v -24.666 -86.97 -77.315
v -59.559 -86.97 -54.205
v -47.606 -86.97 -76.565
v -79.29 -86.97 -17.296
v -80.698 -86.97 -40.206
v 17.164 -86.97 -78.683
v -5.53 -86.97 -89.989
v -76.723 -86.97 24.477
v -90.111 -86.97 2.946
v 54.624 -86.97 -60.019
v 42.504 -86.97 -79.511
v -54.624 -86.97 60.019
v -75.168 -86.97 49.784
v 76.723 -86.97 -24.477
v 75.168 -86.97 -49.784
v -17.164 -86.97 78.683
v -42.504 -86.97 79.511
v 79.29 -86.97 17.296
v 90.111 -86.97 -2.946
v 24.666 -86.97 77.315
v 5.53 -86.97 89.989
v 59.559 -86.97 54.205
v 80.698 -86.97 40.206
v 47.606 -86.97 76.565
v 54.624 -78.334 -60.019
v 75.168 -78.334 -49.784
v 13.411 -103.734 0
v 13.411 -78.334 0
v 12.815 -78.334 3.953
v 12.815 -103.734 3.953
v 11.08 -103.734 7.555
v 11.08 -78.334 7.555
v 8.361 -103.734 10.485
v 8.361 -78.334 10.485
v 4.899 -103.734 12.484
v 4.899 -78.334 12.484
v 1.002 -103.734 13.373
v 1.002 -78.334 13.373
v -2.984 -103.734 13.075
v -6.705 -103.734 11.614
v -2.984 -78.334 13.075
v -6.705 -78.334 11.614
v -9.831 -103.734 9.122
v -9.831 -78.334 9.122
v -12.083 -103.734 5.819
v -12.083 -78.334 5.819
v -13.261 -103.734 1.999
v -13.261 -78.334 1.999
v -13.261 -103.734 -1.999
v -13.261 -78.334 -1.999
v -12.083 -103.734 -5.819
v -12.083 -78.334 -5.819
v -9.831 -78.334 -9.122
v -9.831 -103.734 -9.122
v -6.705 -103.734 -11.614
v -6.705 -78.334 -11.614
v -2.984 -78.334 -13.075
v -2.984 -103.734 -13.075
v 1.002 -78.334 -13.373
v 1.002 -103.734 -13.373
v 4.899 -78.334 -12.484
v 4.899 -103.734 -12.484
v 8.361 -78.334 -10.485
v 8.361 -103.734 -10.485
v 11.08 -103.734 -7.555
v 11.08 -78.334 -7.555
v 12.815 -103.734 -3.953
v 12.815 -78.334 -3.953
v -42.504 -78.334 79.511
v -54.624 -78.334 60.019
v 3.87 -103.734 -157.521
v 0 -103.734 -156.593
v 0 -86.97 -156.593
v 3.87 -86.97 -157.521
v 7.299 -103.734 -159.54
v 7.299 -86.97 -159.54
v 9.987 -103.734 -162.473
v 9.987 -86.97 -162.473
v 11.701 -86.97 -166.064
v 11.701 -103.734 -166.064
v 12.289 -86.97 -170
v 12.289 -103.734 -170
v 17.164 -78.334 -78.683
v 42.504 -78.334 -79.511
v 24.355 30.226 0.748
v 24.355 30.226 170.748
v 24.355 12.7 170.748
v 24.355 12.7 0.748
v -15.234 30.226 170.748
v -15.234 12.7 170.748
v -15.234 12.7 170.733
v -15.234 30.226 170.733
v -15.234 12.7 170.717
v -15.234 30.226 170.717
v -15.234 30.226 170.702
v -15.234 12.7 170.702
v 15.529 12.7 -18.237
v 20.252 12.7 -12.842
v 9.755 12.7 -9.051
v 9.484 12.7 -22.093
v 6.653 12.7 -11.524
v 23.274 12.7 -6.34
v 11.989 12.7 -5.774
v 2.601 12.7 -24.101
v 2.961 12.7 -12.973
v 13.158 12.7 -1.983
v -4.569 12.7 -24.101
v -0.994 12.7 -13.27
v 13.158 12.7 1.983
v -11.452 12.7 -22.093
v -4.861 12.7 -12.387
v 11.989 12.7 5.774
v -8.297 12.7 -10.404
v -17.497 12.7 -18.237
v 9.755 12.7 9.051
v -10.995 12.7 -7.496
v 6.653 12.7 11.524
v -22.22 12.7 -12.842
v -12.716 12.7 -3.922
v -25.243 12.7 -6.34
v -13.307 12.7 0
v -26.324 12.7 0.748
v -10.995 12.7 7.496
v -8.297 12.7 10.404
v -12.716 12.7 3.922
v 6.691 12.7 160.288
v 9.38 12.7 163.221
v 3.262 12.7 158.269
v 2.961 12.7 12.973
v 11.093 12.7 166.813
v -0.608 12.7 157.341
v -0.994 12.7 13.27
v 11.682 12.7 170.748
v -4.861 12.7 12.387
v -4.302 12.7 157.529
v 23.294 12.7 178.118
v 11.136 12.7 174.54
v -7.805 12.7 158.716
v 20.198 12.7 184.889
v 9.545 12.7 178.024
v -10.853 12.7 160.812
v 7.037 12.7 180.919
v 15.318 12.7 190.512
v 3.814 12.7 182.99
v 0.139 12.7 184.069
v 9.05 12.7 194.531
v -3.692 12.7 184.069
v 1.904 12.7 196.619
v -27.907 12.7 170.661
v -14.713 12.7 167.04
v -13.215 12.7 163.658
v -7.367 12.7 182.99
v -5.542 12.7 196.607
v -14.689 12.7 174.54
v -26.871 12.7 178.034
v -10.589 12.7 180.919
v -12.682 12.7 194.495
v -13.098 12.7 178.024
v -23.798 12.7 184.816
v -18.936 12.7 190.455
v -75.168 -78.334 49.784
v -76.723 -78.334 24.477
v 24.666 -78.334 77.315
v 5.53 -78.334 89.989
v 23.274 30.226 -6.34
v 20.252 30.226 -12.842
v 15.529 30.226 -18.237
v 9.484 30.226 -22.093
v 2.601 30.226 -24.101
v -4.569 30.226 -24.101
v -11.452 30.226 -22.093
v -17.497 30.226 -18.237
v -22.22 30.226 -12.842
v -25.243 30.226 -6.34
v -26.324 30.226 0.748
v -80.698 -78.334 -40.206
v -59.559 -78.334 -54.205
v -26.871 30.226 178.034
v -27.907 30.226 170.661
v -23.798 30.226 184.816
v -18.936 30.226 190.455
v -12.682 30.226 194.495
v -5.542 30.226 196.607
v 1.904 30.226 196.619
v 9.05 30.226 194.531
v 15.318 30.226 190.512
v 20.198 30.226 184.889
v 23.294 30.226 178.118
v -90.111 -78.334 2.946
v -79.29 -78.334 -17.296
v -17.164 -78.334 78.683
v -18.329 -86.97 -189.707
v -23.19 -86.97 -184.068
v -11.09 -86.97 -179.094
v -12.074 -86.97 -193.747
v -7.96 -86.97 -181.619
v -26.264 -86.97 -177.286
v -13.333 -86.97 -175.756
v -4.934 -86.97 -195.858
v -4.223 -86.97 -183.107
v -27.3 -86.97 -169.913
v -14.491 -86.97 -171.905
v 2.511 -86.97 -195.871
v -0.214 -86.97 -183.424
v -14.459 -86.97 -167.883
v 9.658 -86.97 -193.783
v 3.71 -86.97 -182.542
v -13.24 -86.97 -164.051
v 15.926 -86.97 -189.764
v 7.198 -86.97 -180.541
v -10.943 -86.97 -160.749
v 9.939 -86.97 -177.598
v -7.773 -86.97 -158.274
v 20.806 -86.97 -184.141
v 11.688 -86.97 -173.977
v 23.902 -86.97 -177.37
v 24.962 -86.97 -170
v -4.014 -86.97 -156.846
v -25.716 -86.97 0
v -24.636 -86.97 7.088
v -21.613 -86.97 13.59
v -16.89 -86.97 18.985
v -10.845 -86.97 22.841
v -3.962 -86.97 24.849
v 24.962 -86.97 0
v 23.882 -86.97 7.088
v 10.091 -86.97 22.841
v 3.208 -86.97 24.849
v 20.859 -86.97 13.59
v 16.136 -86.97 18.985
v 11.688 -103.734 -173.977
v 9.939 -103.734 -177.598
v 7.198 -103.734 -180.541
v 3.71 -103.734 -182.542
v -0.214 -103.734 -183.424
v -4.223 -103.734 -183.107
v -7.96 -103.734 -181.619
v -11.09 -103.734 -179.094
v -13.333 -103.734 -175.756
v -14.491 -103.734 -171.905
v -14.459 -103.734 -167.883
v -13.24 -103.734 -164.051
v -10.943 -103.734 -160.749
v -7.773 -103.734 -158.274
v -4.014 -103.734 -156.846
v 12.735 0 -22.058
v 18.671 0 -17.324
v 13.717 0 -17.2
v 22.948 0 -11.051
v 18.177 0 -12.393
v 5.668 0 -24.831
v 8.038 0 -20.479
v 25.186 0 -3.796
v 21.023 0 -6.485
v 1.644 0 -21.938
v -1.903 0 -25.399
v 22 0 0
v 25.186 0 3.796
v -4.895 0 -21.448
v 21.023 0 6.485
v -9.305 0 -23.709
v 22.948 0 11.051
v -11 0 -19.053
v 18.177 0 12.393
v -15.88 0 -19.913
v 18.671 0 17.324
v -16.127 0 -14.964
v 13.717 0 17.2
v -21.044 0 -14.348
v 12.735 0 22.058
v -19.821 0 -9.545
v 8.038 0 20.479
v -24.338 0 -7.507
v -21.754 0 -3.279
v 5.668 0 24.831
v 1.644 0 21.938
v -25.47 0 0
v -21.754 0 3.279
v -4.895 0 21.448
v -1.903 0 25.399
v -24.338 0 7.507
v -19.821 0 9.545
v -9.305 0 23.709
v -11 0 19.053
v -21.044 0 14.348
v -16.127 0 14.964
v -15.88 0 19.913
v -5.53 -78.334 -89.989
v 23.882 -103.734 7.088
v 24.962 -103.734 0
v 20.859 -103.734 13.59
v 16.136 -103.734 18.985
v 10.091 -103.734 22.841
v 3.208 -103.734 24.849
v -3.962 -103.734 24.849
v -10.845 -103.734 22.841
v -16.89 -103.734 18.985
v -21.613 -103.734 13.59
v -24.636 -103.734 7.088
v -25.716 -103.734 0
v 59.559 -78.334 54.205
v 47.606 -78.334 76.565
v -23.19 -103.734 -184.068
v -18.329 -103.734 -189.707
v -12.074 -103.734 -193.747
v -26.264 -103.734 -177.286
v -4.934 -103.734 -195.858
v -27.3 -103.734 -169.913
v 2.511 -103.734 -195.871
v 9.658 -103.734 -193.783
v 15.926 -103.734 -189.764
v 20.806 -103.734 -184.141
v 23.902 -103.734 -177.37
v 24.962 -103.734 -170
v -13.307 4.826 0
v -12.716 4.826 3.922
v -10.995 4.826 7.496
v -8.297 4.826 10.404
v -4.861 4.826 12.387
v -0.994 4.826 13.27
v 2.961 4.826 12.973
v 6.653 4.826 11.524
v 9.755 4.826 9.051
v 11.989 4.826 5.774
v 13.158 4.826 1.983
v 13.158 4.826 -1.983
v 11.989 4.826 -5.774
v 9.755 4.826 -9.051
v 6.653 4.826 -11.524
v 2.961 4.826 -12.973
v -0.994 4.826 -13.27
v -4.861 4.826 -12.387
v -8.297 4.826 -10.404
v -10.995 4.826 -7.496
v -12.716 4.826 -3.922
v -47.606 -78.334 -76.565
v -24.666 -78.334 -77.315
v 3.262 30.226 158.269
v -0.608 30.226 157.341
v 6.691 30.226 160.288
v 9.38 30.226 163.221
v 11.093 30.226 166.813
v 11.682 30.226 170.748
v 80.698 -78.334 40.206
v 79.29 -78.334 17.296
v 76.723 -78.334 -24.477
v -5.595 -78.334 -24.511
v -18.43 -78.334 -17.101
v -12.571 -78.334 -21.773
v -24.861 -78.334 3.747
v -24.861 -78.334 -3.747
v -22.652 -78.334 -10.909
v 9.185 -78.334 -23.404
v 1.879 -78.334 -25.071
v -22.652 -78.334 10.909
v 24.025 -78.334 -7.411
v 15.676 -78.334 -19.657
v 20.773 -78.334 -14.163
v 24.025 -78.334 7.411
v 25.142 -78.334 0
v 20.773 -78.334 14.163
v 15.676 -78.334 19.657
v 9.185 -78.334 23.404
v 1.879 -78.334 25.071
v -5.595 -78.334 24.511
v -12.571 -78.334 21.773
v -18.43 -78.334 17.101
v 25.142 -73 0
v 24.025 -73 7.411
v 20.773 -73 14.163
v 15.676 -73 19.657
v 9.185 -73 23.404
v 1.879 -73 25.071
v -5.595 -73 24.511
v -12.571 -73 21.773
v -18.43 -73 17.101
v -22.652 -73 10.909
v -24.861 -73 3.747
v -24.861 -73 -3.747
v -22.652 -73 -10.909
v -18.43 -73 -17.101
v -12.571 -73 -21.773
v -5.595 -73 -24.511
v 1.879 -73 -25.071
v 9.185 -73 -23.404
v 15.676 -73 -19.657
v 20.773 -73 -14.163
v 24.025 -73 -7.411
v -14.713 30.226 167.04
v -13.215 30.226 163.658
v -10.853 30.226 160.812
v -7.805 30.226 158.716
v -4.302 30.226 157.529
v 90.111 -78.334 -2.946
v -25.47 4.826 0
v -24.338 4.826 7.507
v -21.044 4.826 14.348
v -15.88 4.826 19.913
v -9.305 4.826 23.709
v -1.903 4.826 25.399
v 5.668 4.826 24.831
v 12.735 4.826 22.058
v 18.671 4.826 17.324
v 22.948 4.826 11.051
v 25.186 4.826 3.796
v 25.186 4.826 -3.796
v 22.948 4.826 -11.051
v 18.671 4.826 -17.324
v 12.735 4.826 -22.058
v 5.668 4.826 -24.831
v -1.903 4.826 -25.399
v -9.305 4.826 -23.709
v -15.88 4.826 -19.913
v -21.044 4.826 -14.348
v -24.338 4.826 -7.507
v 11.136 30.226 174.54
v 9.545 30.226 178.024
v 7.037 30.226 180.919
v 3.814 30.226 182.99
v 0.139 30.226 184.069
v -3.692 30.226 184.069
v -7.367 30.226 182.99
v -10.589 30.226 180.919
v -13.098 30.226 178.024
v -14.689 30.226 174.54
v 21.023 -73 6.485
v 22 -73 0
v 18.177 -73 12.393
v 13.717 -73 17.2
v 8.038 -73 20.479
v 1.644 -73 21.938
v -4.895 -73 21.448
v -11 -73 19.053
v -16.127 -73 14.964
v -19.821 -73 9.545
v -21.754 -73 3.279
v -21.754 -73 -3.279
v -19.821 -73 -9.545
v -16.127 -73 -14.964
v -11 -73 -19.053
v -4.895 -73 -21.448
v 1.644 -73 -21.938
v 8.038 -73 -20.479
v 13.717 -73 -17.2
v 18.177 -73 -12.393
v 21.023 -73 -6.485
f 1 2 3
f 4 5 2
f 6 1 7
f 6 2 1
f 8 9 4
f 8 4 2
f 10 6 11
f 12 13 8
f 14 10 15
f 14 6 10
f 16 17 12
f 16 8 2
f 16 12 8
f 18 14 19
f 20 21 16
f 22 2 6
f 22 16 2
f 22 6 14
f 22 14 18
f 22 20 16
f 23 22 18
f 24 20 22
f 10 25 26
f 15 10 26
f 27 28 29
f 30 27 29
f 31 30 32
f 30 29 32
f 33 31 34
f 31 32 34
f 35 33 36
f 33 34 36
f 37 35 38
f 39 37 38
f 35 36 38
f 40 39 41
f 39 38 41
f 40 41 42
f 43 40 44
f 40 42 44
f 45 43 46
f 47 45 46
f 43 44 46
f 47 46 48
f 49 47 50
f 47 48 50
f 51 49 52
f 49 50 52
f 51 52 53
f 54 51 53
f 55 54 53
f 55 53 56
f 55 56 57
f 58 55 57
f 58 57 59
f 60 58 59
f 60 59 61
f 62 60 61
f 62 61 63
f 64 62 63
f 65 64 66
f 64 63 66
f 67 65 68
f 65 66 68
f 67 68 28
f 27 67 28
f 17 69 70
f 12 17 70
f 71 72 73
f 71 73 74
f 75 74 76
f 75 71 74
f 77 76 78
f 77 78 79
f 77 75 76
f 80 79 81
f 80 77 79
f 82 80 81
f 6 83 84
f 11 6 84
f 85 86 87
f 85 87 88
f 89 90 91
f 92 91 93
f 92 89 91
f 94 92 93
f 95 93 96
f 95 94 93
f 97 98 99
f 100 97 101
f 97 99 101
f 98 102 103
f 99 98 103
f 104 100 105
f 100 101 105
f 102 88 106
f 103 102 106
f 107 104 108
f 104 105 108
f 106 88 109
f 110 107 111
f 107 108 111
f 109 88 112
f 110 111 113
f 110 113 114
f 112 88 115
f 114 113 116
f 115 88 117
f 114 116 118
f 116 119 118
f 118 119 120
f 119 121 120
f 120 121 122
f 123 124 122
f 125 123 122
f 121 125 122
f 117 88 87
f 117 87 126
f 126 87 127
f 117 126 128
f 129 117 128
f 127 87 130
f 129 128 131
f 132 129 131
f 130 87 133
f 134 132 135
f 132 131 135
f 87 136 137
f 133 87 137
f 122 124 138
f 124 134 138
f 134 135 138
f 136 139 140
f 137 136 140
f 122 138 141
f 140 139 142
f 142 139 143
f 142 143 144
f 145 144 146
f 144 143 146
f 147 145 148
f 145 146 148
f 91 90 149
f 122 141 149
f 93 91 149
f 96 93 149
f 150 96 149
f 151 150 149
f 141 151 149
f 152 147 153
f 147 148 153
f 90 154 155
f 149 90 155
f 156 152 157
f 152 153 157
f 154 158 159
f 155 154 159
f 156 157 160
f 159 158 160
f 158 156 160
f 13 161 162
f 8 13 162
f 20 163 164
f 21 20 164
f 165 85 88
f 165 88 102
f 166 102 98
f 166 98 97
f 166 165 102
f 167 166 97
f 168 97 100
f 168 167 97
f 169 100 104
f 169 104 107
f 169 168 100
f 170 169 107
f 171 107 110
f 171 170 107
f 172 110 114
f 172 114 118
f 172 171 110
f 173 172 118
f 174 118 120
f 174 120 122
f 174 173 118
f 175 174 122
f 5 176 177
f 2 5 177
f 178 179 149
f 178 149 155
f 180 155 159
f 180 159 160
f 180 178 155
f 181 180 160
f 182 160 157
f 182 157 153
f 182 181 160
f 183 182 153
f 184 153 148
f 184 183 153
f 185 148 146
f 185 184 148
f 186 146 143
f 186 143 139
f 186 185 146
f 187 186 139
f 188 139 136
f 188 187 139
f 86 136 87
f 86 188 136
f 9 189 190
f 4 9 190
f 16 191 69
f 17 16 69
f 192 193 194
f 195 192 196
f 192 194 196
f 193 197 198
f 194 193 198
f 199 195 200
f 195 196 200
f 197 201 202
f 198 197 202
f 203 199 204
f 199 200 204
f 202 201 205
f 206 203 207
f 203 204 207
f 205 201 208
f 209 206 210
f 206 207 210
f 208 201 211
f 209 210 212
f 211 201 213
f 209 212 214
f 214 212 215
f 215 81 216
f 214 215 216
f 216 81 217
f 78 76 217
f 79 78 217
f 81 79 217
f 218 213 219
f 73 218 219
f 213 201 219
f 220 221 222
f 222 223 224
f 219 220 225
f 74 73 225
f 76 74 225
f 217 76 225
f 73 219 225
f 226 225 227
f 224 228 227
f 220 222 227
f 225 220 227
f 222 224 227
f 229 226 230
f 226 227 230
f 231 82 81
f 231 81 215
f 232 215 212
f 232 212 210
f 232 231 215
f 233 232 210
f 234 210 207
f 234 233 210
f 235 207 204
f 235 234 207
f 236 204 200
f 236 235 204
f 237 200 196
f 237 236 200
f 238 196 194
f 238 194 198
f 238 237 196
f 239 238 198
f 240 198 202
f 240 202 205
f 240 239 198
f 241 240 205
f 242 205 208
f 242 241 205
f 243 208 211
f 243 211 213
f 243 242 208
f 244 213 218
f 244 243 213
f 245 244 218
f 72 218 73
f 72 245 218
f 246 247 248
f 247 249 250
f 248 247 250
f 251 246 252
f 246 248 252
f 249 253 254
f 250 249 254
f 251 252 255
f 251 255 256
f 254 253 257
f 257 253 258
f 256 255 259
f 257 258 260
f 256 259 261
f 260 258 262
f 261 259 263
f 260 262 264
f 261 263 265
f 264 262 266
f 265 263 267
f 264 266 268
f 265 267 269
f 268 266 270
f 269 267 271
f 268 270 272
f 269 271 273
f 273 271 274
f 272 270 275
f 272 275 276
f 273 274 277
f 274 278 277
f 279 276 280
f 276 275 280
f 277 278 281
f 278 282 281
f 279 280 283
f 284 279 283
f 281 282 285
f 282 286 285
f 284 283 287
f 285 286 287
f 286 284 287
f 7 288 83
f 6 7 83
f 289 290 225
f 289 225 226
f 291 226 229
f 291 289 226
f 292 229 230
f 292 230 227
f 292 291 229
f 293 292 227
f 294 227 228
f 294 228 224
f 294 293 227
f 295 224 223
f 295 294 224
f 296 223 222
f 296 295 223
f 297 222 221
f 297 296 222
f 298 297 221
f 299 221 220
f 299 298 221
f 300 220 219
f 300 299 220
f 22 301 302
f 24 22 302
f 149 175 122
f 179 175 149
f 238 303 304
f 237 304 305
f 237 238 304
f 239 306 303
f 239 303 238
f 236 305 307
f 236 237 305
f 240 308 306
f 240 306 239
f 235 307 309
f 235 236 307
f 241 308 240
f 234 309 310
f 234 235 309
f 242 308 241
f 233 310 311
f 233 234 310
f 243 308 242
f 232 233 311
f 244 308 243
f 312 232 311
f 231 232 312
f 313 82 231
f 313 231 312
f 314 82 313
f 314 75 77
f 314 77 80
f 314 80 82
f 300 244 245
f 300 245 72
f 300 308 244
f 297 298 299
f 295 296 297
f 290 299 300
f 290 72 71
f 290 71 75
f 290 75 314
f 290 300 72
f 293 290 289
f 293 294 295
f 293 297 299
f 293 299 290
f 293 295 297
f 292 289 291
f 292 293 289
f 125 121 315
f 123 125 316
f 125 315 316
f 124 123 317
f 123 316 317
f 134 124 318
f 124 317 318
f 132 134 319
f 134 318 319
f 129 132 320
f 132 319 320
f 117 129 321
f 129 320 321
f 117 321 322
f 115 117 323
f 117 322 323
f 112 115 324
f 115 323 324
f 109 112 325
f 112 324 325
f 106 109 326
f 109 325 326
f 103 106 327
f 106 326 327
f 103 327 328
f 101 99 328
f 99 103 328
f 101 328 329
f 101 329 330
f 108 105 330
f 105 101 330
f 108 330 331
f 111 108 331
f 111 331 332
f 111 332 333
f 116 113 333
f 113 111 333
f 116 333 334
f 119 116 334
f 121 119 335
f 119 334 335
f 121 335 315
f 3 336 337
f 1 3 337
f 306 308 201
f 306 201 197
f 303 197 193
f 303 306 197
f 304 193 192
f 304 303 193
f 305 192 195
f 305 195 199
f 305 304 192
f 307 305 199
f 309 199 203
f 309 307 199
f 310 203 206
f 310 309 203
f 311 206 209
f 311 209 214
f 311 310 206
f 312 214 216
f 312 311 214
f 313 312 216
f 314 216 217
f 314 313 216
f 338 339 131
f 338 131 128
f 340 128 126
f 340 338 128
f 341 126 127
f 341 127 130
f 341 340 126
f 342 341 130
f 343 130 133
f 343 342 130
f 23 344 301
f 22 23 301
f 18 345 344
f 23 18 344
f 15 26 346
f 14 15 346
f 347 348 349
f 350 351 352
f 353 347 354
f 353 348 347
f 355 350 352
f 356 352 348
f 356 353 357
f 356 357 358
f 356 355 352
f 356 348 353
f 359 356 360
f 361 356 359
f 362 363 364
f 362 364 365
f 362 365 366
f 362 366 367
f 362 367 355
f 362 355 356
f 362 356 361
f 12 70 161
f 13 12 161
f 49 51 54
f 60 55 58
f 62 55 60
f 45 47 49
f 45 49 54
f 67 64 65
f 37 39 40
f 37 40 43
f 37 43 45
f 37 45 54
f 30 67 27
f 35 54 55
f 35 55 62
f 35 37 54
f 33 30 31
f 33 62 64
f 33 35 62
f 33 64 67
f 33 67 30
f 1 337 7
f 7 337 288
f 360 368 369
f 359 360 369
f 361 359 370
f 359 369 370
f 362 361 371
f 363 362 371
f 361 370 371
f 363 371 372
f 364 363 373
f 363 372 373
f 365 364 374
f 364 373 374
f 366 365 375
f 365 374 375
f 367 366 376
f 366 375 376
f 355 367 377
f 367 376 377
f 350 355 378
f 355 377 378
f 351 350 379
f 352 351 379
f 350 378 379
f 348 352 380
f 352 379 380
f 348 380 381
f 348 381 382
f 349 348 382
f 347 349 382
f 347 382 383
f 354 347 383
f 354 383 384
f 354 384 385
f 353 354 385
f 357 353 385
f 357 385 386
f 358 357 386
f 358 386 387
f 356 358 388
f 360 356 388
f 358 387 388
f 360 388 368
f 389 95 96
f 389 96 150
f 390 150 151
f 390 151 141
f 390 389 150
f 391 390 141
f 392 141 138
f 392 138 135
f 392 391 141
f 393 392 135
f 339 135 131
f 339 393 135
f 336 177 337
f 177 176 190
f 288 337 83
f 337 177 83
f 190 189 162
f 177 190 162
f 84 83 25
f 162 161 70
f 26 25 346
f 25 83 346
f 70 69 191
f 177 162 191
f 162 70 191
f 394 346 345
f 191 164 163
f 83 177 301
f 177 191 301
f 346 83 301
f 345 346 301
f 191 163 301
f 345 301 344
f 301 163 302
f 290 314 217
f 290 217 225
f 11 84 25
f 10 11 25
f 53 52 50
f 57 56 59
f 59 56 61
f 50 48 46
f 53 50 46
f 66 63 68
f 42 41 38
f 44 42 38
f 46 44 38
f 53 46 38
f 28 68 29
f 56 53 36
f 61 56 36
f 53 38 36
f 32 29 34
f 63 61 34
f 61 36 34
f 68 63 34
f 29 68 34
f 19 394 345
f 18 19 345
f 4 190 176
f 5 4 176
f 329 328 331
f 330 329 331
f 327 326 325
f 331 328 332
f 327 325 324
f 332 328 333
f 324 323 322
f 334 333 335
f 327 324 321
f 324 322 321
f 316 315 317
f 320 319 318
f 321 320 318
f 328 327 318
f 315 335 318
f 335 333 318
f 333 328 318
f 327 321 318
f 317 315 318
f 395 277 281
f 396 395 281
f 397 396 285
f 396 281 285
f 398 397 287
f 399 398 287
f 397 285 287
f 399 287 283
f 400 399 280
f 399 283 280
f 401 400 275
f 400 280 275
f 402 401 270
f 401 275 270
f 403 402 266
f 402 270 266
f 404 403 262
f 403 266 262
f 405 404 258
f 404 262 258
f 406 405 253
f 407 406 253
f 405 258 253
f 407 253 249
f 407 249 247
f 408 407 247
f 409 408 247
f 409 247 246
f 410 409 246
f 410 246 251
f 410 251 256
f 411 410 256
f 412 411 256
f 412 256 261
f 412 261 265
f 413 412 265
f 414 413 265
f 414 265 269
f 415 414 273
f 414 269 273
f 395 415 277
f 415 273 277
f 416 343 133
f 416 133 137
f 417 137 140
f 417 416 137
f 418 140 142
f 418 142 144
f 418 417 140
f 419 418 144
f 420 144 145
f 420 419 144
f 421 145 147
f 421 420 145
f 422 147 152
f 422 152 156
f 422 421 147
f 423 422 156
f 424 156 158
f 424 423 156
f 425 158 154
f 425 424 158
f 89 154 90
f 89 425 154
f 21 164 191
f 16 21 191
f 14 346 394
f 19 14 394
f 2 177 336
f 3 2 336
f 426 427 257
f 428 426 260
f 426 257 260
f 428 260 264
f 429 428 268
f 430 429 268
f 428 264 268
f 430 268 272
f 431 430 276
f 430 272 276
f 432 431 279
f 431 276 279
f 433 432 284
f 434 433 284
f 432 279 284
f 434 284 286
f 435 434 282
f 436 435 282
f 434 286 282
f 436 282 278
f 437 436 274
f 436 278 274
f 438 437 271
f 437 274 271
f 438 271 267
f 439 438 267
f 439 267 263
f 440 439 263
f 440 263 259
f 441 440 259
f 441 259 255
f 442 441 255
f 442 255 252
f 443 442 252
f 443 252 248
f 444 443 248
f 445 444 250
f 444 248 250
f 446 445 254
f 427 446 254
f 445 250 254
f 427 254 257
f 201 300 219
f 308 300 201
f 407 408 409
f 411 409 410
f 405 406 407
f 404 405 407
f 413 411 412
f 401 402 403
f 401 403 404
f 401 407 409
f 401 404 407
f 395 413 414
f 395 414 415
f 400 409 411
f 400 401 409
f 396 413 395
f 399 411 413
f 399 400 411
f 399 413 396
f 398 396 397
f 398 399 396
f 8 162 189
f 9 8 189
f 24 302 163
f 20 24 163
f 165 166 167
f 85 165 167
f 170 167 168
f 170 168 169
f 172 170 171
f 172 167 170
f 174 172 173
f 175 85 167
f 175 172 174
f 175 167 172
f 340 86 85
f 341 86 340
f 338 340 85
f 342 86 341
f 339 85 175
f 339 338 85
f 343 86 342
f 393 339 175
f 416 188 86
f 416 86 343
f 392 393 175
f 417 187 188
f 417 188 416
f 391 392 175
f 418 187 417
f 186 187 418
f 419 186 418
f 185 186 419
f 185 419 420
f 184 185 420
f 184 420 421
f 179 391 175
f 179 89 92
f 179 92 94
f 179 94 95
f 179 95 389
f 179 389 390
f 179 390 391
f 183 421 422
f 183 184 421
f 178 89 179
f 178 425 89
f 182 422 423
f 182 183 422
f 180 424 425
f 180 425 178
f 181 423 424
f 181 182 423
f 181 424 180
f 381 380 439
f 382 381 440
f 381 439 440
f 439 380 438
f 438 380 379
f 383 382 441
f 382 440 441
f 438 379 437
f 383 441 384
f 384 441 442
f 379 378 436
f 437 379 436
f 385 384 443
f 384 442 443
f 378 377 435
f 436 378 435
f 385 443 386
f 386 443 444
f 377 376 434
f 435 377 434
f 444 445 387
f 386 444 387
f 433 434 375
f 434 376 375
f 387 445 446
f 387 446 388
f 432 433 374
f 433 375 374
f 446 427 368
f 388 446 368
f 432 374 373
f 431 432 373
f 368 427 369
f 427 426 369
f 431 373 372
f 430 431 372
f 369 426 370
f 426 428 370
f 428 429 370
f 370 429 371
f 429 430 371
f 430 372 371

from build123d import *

# Parameters (mm, degrees)
F0_R      = 22
F1_DEPTH  = 73
F2_R      = 25.141688448
F3_DEPTH  = 5.334
F4_R      = 25.4700535037
F5_DEPTH  = 4.826
F6_R      = 13.3067091681
F7_DEPTH  = 25.4
F8_R      = 13.4107525154
F9_DEPTH  = 25.4
F11_DEPTH = 16.764
F13_DEPTH = 17.526
F15_DEPTH = 8.636


with BuildPart() as f1:
    # F0 (on Front) → F1 (new body)
    with BuildSketch(Plane.XZ):
        Circle(F0_R)
    extrude(amount=F1_DEPTH)

    # F2 (on face) → F3 (join)
    with BuildSketch(Plane.XZ.offset(73)):
        Circle(F2_R)
    extrude(amount=F3_DEPTH)

    # F4 (on face) → F5 (join)
    with BuildSketch(Plane(origin=(0, 0, 0), x_dir=(-1, 0, 0), z_dir=(0, 1, 0))):
        Circle(F4_R)
    extrude(amount=F5_DEPTH)


with BuildPart() as f7:
    # F6 (on face) → F7 (new body)
    with BuildSketch(Plane(origin=(0, 4.826, 0), x_dir=(-1, 0, 0), z_dir=(0, 1, 0))):
        Circle(F6_R)
    extrude(amount=F7_DEPTH)

    # F12 (on face) → F13 (join)
    with BuildSketch(Plane(origin=(0, 30.226, 0), x_dir=(-1, 0, 0), z_dir=(0, 1, 0))):
        with BuildLine():
            Line((-24.354988928, 0.7480883902), (0.6075108098, 0.7480883902))
            Line((0.6075108098, 0.7480883902), (0.6075108098, 157.3410739564))
            ThreePointArc((0.6075108098, 157.3410739564), (-8.1445009129, 161.654541128), (-11.6816051556, 170.7480883902))
            Line((-11.6816051556, 170.7480883902), (-24.354988928, 170.7480883902))
            Line((-24.354988928, 170.7480883902), (-24.354988928, 0.7480883902))
        make_face()
        with BuildLine():
            Line((26.3235455053, 0.7480883902), (0.6075108098, 0.7480883902))
            Line((0.6075108098, 0.7480883902), (-24.354988928, 0.7480883902))
            ThreePointArc((-24.354988928, 0.7480883902), (0.9842782886, -24.3560850854), (26.3235455053, 0.7480883902))
        make_face()
        with BuildLine():
            Line((0.6075108098, 157.3410739564), (0.6075108098, 0.7480883902))
            Line((0.6075108098, 0.7480883902), (26.3235455053, 0.7480883902))
            Line((26.3235455053, 0.7480883902), (27.9073545741, 170.6612540395))
            Line((27.9073545741, 170.6612540395), (15.2340346622, 170.7015648748))
            ThreePointArc((15.2340346622, 170.7015648748), (10.8526407, 160.8116292201), (0.6075108098, 157.3410739564))
        make_face()
        with BuildLine():
            Line((-24.354988928, 170.7480883902), (-11.6816051556, 170.7480883902))
            ThreePointArc((-11.6816051556, 170.7480883902), (1.7762549611, 184.2059485069), (15.2341150778, 170.7480883902))
            ThreePointArc((15.2341150778, 170.7480883902), (15.2340949738, 170.7248265978), (15.2340346622, 170.7015648748))
            Line((15.2340346622, 170.7015648748), (27.9073545741, 170.6612540395))
            ThreePointArc((27.9073545741, 170.6612540395), (1.8196721964, 196.8792962103), (-24.354988928, 170.7480883902))
        make_face()
    extrude(amount=-F13_DEPTH)


with BuildPart() as f9:
    # F8 (on face) → F9 (new body)
    with BuildSketch(Plane.XZ.offset(78.334)):
        Circle(F8_R)
    extrude(amount=F9_DEPTH)


with BuildPart() as f11:
    # F10 (on face) → F11 (new body)
    with BuildSketch(Plane.XZ.offset(103.734)):
        with BuildLine():
            Line((24.9624997377, 0), (0, 0))
            Line((0, 0), (0, -156.5929855662))
            ThreePointArc((0, -156.5929855662), (8.7520117226, -160.9064527378), (12.2891159654, -170))
            Line((12.2891159654, -170), (24.9624997377, -170))
            Line((24.9624997377, -170), (24.9624997377, 0))
        make_face()
        with BuildLine():
            Line((-25.7160346955, 0), (0, 0))
            Line((0, 0), (24.9624997377, 0))
            ThreePointArc((24.9624997377, 0), (-0.3767674789, 25.1041734756), (-25.7160346955, 0))
        make_face()
        with BuildLine():
            Line((0, -156.5929855662), (0, 0))
            Line((0, 0), (-25.7160346955, 0))
            Line((-25.7160346955, 0), (-27.2998437643, -169.9131656493))
            Line((-27.2998437643, -169.9131656493), (-14.6265238524, -169.9534764846))
            ThreePointArc((-14.6265238524, -169.9534764846), (-10.2451298902, -160.0635408299), (0, -156.5929855662))
        make_face()
        with BuildLine():
            Line((24.9624997377, -170), (12.2891159654, -170))
            ThreePointArc((12.2891159654, -170), (-1.1920059438, -183.4578400128), (-14.6265238524, -169.9534764846))
            Line((-14.6265238524, -169.9534764846), (-27.2998437643, -169.9131656493))
            ThreePointArc((-27.2998437643, -169.9131656493), (-1.2121613866, -196.13120782), (24.9624997377, -170))
        make_face()
    extrude(amount=-F11_DEPTH)


with BuildPart() as f15:
    # F14 (on face) → F15 (new body)
    with BuildSketch(Plane.XZ.offset(78.334)):
        Polygon((59.5593075378, 54.2054606984), (47.6064203831, 76.5652511255), (24.6660799297, 77.3151775524), align=None)
        Polygon((80.697740251, 40.2055177804), (59.5593075378, 54.2054606984), (79.2899478234, 17.2961369453), align=None)
        Polygon((79.2899478234, 17.2961369453), (59.5593075378, 54.2054606984), (24.6660799297, 77.3151775524), (-17.1636522197, 78.6826037088), (-54.6238678937, 60.0190406071), (-76.7229597576, 24.4771430104), (-79.2899478234, -17.2961369453), (-59.5593075378, -54.2054606984), (-24.6660799297, -77.3151775524), (17.1636522197, -78.6826037088), (54.6238678937, -60.0190406071), (76.7229597576, -24.4771430104), align=None)
        Polygon((-17.1636522197, 78.6826037088), (24.6660799297, 77.3151775524), (5.5298703554, 89.9890519755), align=None)
        Polygon((90.1106627134, -2.9457438723), (79.2899478234, 17.2961369453), (76.7229597576, -24.4771430104), align=None)
        Polygon((-54.6238678937, 60.0190406071), (-17.1636522197, 78.6826037088), (-42.5042423302, 79.5109949978), align=None)
        Polygon((75.1678698956, -49.7835341952), (76.7229597576, -24.4771430104), (54.6238678937, -60.0190406071), align=None)
        Polygon((-76.7229597576, 24.4771430104), (-54.6238678937, 60.0190406071), (-75.1678698956, 49.7835341952), align=None)
        Polygon((42.5042423302, -79.5109949978), (54.6238678937, -60.0190406071), (17.1636522197, -78.6826037088), align=None)
        Polygon((-79.2899478234, -17.2961369453), (-76.7229597576, 24.4771430104), (-90.1106627134, 2.9457438723), align=None)
        Polygon((-5.5298703554, -89.9890519755), (17.1636522197, -78.6826037088), (-24.6660799297, -77.3151775524), align=None)
        Polygon((-59.5593075378, -54.2054606984), (-79.2899478234, -17.2961369453), (-80.697740251, -40.2055177804), align=None)
        Polygon((-47.6064203831, -76.5652511255), (-24.6660799297, -77.3151775524), (-59.5593075378, -54.2054606984), align=None)
    extrude(amount=F15_DEPTH)


solid = Compound([f1.part, f7.part, f9.part, f11.part, f15.part])
